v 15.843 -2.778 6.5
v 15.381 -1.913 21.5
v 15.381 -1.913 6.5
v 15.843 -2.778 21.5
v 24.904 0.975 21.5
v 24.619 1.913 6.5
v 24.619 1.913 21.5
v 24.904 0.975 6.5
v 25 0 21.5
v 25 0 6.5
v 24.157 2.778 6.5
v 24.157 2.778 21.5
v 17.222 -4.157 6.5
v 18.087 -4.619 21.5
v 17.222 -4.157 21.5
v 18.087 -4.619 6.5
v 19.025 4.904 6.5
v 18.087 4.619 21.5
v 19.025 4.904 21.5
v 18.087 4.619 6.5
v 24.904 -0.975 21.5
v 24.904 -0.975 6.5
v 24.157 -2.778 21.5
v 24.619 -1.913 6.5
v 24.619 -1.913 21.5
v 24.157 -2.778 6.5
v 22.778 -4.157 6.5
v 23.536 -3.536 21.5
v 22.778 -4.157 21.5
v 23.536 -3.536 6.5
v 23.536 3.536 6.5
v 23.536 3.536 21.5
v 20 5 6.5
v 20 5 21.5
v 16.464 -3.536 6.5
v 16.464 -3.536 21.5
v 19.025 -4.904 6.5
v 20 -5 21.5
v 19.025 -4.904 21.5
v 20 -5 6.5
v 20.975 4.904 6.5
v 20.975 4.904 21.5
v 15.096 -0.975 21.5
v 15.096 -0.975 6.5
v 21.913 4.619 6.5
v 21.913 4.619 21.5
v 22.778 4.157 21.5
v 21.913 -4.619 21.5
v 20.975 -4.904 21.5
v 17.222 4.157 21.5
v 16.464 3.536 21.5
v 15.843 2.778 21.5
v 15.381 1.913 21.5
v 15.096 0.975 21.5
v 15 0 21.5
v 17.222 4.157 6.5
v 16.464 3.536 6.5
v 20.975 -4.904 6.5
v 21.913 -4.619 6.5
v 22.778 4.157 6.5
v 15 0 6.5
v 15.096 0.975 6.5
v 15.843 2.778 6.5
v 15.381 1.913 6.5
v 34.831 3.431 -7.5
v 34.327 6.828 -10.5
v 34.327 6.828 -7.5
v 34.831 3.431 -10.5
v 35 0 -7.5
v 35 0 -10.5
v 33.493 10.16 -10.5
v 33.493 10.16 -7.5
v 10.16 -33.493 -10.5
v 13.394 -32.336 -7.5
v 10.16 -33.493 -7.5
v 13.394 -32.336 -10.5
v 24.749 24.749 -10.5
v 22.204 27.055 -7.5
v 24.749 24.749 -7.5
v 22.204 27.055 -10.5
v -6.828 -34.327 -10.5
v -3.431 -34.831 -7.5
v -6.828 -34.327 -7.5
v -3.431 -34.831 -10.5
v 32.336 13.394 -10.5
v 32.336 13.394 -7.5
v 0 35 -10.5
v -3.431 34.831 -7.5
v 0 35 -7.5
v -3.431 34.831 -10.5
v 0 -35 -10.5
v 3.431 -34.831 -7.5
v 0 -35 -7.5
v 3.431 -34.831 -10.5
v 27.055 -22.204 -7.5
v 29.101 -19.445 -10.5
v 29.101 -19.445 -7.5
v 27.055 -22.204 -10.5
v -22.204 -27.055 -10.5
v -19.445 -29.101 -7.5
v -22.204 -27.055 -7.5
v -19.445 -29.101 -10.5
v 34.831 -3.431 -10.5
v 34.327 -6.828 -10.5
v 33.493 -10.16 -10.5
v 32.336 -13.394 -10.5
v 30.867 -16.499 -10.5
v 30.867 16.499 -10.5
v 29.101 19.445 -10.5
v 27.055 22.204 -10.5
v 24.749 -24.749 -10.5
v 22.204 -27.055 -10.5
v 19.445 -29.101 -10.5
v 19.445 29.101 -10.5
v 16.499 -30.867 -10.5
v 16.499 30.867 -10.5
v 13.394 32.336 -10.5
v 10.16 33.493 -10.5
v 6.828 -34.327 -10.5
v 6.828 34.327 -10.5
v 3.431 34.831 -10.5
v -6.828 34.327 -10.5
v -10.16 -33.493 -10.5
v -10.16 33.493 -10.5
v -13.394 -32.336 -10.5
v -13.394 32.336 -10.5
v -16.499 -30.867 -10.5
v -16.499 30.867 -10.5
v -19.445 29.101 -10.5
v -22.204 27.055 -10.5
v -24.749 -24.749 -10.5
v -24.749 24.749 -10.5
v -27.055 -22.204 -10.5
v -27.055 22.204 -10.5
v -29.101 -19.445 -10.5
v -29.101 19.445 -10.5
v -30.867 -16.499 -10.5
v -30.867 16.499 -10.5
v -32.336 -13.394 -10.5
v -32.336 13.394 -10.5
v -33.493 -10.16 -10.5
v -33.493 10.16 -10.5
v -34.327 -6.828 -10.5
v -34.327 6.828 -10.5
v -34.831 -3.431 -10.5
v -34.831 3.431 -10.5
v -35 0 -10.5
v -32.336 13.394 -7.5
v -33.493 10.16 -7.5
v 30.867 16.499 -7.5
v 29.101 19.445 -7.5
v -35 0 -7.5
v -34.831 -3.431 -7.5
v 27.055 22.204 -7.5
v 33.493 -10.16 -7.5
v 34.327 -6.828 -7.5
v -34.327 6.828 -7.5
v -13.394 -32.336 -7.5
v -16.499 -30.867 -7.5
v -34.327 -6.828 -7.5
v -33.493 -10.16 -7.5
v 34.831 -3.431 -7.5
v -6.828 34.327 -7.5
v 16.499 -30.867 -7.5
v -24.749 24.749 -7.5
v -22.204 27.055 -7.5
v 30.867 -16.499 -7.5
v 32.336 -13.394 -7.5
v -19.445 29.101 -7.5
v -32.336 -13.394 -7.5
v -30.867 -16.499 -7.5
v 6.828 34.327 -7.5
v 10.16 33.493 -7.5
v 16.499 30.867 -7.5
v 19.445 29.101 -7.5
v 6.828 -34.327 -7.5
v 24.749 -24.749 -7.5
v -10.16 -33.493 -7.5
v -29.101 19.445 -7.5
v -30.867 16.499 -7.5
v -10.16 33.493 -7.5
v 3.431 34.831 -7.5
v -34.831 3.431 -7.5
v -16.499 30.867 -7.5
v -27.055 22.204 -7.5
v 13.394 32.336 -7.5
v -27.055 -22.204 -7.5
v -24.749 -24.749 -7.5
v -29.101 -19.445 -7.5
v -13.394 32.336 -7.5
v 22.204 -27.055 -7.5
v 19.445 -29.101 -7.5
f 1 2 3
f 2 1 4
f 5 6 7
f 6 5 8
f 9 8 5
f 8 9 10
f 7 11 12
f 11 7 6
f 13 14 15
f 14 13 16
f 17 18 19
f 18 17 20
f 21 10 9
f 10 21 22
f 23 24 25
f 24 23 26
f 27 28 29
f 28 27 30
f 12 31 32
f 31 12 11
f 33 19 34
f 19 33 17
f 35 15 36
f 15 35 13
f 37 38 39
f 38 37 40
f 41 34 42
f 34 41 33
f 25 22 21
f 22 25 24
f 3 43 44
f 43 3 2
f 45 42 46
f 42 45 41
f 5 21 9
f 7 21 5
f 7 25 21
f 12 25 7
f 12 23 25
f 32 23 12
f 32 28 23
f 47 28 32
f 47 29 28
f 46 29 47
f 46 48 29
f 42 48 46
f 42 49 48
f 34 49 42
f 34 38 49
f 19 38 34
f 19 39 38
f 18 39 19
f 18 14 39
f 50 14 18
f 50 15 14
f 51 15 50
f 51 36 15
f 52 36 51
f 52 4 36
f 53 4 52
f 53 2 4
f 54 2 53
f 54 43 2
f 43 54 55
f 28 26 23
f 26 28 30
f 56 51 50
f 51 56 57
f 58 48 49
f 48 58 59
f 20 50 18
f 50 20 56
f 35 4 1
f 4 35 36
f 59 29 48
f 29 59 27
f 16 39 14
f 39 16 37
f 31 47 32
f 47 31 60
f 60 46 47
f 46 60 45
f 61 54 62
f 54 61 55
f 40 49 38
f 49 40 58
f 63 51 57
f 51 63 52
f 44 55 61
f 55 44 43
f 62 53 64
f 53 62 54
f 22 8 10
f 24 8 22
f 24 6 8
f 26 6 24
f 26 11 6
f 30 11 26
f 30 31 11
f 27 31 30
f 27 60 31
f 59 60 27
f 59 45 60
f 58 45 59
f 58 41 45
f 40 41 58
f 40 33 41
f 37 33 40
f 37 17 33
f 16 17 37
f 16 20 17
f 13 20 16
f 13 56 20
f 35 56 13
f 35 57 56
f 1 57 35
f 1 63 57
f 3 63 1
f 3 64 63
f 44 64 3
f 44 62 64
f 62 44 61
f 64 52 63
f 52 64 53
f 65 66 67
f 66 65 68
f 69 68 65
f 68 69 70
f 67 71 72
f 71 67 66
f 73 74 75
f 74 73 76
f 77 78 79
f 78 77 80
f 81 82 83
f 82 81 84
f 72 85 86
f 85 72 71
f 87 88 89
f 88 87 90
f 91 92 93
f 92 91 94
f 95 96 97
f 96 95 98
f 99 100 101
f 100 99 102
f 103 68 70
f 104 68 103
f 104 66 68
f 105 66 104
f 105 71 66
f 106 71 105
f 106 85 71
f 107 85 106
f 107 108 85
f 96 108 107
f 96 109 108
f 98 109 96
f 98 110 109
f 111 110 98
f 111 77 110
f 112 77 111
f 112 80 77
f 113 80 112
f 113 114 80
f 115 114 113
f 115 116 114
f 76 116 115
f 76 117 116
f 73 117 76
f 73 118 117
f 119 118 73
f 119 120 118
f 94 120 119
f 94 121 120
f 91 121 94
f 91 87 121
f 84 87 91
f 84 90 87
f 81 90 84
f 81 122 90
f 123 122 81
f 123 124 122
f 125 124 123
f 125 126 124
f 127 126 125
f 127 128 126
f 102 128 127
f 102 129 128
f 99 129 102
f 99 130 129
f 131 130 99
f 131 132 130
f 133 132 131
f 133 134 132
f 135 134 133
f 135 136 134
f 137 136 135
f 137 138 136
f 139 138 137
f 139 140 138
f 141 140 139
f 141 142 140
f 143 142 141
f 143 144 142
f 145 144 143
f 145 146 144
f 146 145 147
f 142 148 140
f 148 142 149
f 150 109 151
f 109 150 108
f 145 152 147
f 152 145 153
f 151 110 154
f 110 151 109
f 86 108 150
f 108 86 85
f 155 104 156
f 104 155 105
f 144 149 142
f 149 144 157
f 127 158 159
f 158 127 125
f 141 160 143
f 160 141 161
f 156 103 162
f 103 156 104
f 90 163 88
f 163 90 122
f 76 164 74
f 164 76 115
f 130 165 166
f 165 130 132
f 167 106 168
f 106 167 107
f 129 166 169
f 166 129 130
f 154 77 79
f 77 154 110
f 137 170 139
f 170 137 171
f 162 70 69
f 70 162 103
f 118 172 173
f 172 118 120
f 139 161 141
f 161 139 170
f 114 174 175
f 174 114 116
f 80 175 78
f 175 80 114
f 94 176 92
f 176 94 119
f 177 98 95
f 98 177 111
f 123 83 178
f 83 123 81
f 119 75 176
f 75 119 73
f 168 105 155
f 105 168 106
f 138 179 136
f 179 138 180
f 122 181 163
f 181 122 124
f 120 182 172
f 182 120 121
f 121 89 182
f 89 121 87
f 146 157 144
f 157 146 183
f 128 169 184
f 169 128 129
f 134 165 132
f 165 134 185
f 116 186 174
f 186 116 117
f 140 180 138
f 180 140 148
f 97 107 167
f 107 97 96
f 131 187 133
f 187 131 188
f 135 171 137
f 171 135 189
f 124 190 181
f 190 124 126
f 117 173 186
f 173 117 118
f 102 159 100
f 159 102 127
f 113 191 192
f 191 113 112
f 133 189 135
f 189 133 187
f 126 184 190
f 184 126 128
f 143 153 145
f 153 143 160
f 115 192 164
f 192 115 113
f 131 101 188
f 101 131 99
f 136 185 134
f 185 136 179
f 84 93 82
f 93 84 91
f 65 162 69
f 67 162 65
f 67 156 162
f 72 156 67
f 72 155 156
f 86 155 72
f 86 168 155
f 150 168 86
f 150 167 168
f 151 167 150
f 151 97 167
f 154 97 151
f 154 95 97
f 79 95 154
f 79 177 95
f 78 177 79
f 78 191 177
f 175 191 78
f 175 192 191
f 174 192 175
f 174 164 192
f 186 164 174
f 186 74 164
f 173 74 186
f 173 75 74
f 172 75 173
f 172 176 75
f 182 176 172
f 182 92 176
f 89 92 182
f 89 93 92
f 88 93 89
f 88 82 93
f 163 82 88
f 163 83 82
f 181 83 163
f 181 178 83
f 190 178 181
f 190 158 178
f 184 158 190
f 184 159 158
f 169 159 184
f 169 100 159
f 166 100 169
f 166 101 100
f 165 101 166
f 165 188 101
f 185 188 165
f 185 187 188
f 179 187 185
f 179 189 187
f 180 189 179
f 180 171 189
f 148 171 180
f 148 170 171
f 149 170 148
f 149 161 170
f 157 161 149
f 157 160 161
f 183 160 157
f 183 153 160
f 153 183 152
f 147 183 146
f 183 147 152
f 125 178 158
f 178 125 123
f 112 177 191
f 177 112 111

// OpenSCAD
// https://www.youtube.com/watch?v=ed7T2NG7j38 Magnet LTD Ringbom Stirling engine
// https://www.youtube.com/watch?v=TzweLbneAXg Low Temperature Stirling Motor with neodym magnet
// https://www.youtube.com/watch?v=wGRmcvxB_dk How A Stirling Engine Works

// small piston
dim_piston_worker    =  [ 10.0, 15.0    ]; // outer d, h of working piston
dim_piston_worker_stroke = 10;

// big piston
dim_cylinder_worker  =  [ 10.1, 15.0, 1 ]; // inner d, h, thickness of working cylinder


dim_piston_mixer     =  [ 70.0,  3.0    ]; // outer d, h of mixer piston
dim_cylinder_mixer   =  [ 72.0, 10.0, 1 ]; // inner d, h, thickness of mixer cylinder

pos_worker = [20,0,10];
dim_piston_worker_stroke = 6;
z_worker   = 4+dim_piston_worker_stroke/2*sin(360*$t);


pos_mixer  = [0,0,-10];
z_mixer    = sin(360*$t + 90);

module piston_worker()
{
  cylinder(d = dim_piston_worker[0], h = dim_piston_worker[1], $fn=32, center=true);
}

module cylinder_worker()
{
  difference()
  {
    cylinder(d = dim_cylinder_worker[0]+dim_cylinder_worker[2], h = dim_cylinder_worker[1], $fn=64, center=true);

    cylinder(d = dim_cylinder_worker[0], h = dim_cylinder_worker[1]+0.1, $fn=64, center=true);
  }
}

module piston_mixer()
{
  cylinder(d = dim_piston_mixer[0], h = dim_piston_mixer[1], $fn=64, center=true);
}

module cylinder_mixer()
{
  difference()
  {
    cylinder(d = dim_cylinder_mixer[0]+dim_cylinder_mixer[2], h = dim_cylinder_mixer[1], $fn=64, center=true);

    cylinder(d = dim_cylinder_mixer[0], h = dim_cylinder_mixer[1]+0.1, $fn=64, center=true);
  }
}

color(c=[0.5,0.5,0.5,0.5])
  translate(pos_worker)
    %cylinder_worker();

color(c=[1,1,1,0.9]) // rgba
  translate(pos_worker+[0,0,z_worker])
    piston_worker();

color(c=[0.5,0.5,0.5,0.5])
  translate(pos_mixer)
    %cylinder_mixer();

color(c=[0.3,0.6,0.3,0.99]) // rgba
  translate(pos_mixer+[0,0,z_mixer])
    piston_mixer();
